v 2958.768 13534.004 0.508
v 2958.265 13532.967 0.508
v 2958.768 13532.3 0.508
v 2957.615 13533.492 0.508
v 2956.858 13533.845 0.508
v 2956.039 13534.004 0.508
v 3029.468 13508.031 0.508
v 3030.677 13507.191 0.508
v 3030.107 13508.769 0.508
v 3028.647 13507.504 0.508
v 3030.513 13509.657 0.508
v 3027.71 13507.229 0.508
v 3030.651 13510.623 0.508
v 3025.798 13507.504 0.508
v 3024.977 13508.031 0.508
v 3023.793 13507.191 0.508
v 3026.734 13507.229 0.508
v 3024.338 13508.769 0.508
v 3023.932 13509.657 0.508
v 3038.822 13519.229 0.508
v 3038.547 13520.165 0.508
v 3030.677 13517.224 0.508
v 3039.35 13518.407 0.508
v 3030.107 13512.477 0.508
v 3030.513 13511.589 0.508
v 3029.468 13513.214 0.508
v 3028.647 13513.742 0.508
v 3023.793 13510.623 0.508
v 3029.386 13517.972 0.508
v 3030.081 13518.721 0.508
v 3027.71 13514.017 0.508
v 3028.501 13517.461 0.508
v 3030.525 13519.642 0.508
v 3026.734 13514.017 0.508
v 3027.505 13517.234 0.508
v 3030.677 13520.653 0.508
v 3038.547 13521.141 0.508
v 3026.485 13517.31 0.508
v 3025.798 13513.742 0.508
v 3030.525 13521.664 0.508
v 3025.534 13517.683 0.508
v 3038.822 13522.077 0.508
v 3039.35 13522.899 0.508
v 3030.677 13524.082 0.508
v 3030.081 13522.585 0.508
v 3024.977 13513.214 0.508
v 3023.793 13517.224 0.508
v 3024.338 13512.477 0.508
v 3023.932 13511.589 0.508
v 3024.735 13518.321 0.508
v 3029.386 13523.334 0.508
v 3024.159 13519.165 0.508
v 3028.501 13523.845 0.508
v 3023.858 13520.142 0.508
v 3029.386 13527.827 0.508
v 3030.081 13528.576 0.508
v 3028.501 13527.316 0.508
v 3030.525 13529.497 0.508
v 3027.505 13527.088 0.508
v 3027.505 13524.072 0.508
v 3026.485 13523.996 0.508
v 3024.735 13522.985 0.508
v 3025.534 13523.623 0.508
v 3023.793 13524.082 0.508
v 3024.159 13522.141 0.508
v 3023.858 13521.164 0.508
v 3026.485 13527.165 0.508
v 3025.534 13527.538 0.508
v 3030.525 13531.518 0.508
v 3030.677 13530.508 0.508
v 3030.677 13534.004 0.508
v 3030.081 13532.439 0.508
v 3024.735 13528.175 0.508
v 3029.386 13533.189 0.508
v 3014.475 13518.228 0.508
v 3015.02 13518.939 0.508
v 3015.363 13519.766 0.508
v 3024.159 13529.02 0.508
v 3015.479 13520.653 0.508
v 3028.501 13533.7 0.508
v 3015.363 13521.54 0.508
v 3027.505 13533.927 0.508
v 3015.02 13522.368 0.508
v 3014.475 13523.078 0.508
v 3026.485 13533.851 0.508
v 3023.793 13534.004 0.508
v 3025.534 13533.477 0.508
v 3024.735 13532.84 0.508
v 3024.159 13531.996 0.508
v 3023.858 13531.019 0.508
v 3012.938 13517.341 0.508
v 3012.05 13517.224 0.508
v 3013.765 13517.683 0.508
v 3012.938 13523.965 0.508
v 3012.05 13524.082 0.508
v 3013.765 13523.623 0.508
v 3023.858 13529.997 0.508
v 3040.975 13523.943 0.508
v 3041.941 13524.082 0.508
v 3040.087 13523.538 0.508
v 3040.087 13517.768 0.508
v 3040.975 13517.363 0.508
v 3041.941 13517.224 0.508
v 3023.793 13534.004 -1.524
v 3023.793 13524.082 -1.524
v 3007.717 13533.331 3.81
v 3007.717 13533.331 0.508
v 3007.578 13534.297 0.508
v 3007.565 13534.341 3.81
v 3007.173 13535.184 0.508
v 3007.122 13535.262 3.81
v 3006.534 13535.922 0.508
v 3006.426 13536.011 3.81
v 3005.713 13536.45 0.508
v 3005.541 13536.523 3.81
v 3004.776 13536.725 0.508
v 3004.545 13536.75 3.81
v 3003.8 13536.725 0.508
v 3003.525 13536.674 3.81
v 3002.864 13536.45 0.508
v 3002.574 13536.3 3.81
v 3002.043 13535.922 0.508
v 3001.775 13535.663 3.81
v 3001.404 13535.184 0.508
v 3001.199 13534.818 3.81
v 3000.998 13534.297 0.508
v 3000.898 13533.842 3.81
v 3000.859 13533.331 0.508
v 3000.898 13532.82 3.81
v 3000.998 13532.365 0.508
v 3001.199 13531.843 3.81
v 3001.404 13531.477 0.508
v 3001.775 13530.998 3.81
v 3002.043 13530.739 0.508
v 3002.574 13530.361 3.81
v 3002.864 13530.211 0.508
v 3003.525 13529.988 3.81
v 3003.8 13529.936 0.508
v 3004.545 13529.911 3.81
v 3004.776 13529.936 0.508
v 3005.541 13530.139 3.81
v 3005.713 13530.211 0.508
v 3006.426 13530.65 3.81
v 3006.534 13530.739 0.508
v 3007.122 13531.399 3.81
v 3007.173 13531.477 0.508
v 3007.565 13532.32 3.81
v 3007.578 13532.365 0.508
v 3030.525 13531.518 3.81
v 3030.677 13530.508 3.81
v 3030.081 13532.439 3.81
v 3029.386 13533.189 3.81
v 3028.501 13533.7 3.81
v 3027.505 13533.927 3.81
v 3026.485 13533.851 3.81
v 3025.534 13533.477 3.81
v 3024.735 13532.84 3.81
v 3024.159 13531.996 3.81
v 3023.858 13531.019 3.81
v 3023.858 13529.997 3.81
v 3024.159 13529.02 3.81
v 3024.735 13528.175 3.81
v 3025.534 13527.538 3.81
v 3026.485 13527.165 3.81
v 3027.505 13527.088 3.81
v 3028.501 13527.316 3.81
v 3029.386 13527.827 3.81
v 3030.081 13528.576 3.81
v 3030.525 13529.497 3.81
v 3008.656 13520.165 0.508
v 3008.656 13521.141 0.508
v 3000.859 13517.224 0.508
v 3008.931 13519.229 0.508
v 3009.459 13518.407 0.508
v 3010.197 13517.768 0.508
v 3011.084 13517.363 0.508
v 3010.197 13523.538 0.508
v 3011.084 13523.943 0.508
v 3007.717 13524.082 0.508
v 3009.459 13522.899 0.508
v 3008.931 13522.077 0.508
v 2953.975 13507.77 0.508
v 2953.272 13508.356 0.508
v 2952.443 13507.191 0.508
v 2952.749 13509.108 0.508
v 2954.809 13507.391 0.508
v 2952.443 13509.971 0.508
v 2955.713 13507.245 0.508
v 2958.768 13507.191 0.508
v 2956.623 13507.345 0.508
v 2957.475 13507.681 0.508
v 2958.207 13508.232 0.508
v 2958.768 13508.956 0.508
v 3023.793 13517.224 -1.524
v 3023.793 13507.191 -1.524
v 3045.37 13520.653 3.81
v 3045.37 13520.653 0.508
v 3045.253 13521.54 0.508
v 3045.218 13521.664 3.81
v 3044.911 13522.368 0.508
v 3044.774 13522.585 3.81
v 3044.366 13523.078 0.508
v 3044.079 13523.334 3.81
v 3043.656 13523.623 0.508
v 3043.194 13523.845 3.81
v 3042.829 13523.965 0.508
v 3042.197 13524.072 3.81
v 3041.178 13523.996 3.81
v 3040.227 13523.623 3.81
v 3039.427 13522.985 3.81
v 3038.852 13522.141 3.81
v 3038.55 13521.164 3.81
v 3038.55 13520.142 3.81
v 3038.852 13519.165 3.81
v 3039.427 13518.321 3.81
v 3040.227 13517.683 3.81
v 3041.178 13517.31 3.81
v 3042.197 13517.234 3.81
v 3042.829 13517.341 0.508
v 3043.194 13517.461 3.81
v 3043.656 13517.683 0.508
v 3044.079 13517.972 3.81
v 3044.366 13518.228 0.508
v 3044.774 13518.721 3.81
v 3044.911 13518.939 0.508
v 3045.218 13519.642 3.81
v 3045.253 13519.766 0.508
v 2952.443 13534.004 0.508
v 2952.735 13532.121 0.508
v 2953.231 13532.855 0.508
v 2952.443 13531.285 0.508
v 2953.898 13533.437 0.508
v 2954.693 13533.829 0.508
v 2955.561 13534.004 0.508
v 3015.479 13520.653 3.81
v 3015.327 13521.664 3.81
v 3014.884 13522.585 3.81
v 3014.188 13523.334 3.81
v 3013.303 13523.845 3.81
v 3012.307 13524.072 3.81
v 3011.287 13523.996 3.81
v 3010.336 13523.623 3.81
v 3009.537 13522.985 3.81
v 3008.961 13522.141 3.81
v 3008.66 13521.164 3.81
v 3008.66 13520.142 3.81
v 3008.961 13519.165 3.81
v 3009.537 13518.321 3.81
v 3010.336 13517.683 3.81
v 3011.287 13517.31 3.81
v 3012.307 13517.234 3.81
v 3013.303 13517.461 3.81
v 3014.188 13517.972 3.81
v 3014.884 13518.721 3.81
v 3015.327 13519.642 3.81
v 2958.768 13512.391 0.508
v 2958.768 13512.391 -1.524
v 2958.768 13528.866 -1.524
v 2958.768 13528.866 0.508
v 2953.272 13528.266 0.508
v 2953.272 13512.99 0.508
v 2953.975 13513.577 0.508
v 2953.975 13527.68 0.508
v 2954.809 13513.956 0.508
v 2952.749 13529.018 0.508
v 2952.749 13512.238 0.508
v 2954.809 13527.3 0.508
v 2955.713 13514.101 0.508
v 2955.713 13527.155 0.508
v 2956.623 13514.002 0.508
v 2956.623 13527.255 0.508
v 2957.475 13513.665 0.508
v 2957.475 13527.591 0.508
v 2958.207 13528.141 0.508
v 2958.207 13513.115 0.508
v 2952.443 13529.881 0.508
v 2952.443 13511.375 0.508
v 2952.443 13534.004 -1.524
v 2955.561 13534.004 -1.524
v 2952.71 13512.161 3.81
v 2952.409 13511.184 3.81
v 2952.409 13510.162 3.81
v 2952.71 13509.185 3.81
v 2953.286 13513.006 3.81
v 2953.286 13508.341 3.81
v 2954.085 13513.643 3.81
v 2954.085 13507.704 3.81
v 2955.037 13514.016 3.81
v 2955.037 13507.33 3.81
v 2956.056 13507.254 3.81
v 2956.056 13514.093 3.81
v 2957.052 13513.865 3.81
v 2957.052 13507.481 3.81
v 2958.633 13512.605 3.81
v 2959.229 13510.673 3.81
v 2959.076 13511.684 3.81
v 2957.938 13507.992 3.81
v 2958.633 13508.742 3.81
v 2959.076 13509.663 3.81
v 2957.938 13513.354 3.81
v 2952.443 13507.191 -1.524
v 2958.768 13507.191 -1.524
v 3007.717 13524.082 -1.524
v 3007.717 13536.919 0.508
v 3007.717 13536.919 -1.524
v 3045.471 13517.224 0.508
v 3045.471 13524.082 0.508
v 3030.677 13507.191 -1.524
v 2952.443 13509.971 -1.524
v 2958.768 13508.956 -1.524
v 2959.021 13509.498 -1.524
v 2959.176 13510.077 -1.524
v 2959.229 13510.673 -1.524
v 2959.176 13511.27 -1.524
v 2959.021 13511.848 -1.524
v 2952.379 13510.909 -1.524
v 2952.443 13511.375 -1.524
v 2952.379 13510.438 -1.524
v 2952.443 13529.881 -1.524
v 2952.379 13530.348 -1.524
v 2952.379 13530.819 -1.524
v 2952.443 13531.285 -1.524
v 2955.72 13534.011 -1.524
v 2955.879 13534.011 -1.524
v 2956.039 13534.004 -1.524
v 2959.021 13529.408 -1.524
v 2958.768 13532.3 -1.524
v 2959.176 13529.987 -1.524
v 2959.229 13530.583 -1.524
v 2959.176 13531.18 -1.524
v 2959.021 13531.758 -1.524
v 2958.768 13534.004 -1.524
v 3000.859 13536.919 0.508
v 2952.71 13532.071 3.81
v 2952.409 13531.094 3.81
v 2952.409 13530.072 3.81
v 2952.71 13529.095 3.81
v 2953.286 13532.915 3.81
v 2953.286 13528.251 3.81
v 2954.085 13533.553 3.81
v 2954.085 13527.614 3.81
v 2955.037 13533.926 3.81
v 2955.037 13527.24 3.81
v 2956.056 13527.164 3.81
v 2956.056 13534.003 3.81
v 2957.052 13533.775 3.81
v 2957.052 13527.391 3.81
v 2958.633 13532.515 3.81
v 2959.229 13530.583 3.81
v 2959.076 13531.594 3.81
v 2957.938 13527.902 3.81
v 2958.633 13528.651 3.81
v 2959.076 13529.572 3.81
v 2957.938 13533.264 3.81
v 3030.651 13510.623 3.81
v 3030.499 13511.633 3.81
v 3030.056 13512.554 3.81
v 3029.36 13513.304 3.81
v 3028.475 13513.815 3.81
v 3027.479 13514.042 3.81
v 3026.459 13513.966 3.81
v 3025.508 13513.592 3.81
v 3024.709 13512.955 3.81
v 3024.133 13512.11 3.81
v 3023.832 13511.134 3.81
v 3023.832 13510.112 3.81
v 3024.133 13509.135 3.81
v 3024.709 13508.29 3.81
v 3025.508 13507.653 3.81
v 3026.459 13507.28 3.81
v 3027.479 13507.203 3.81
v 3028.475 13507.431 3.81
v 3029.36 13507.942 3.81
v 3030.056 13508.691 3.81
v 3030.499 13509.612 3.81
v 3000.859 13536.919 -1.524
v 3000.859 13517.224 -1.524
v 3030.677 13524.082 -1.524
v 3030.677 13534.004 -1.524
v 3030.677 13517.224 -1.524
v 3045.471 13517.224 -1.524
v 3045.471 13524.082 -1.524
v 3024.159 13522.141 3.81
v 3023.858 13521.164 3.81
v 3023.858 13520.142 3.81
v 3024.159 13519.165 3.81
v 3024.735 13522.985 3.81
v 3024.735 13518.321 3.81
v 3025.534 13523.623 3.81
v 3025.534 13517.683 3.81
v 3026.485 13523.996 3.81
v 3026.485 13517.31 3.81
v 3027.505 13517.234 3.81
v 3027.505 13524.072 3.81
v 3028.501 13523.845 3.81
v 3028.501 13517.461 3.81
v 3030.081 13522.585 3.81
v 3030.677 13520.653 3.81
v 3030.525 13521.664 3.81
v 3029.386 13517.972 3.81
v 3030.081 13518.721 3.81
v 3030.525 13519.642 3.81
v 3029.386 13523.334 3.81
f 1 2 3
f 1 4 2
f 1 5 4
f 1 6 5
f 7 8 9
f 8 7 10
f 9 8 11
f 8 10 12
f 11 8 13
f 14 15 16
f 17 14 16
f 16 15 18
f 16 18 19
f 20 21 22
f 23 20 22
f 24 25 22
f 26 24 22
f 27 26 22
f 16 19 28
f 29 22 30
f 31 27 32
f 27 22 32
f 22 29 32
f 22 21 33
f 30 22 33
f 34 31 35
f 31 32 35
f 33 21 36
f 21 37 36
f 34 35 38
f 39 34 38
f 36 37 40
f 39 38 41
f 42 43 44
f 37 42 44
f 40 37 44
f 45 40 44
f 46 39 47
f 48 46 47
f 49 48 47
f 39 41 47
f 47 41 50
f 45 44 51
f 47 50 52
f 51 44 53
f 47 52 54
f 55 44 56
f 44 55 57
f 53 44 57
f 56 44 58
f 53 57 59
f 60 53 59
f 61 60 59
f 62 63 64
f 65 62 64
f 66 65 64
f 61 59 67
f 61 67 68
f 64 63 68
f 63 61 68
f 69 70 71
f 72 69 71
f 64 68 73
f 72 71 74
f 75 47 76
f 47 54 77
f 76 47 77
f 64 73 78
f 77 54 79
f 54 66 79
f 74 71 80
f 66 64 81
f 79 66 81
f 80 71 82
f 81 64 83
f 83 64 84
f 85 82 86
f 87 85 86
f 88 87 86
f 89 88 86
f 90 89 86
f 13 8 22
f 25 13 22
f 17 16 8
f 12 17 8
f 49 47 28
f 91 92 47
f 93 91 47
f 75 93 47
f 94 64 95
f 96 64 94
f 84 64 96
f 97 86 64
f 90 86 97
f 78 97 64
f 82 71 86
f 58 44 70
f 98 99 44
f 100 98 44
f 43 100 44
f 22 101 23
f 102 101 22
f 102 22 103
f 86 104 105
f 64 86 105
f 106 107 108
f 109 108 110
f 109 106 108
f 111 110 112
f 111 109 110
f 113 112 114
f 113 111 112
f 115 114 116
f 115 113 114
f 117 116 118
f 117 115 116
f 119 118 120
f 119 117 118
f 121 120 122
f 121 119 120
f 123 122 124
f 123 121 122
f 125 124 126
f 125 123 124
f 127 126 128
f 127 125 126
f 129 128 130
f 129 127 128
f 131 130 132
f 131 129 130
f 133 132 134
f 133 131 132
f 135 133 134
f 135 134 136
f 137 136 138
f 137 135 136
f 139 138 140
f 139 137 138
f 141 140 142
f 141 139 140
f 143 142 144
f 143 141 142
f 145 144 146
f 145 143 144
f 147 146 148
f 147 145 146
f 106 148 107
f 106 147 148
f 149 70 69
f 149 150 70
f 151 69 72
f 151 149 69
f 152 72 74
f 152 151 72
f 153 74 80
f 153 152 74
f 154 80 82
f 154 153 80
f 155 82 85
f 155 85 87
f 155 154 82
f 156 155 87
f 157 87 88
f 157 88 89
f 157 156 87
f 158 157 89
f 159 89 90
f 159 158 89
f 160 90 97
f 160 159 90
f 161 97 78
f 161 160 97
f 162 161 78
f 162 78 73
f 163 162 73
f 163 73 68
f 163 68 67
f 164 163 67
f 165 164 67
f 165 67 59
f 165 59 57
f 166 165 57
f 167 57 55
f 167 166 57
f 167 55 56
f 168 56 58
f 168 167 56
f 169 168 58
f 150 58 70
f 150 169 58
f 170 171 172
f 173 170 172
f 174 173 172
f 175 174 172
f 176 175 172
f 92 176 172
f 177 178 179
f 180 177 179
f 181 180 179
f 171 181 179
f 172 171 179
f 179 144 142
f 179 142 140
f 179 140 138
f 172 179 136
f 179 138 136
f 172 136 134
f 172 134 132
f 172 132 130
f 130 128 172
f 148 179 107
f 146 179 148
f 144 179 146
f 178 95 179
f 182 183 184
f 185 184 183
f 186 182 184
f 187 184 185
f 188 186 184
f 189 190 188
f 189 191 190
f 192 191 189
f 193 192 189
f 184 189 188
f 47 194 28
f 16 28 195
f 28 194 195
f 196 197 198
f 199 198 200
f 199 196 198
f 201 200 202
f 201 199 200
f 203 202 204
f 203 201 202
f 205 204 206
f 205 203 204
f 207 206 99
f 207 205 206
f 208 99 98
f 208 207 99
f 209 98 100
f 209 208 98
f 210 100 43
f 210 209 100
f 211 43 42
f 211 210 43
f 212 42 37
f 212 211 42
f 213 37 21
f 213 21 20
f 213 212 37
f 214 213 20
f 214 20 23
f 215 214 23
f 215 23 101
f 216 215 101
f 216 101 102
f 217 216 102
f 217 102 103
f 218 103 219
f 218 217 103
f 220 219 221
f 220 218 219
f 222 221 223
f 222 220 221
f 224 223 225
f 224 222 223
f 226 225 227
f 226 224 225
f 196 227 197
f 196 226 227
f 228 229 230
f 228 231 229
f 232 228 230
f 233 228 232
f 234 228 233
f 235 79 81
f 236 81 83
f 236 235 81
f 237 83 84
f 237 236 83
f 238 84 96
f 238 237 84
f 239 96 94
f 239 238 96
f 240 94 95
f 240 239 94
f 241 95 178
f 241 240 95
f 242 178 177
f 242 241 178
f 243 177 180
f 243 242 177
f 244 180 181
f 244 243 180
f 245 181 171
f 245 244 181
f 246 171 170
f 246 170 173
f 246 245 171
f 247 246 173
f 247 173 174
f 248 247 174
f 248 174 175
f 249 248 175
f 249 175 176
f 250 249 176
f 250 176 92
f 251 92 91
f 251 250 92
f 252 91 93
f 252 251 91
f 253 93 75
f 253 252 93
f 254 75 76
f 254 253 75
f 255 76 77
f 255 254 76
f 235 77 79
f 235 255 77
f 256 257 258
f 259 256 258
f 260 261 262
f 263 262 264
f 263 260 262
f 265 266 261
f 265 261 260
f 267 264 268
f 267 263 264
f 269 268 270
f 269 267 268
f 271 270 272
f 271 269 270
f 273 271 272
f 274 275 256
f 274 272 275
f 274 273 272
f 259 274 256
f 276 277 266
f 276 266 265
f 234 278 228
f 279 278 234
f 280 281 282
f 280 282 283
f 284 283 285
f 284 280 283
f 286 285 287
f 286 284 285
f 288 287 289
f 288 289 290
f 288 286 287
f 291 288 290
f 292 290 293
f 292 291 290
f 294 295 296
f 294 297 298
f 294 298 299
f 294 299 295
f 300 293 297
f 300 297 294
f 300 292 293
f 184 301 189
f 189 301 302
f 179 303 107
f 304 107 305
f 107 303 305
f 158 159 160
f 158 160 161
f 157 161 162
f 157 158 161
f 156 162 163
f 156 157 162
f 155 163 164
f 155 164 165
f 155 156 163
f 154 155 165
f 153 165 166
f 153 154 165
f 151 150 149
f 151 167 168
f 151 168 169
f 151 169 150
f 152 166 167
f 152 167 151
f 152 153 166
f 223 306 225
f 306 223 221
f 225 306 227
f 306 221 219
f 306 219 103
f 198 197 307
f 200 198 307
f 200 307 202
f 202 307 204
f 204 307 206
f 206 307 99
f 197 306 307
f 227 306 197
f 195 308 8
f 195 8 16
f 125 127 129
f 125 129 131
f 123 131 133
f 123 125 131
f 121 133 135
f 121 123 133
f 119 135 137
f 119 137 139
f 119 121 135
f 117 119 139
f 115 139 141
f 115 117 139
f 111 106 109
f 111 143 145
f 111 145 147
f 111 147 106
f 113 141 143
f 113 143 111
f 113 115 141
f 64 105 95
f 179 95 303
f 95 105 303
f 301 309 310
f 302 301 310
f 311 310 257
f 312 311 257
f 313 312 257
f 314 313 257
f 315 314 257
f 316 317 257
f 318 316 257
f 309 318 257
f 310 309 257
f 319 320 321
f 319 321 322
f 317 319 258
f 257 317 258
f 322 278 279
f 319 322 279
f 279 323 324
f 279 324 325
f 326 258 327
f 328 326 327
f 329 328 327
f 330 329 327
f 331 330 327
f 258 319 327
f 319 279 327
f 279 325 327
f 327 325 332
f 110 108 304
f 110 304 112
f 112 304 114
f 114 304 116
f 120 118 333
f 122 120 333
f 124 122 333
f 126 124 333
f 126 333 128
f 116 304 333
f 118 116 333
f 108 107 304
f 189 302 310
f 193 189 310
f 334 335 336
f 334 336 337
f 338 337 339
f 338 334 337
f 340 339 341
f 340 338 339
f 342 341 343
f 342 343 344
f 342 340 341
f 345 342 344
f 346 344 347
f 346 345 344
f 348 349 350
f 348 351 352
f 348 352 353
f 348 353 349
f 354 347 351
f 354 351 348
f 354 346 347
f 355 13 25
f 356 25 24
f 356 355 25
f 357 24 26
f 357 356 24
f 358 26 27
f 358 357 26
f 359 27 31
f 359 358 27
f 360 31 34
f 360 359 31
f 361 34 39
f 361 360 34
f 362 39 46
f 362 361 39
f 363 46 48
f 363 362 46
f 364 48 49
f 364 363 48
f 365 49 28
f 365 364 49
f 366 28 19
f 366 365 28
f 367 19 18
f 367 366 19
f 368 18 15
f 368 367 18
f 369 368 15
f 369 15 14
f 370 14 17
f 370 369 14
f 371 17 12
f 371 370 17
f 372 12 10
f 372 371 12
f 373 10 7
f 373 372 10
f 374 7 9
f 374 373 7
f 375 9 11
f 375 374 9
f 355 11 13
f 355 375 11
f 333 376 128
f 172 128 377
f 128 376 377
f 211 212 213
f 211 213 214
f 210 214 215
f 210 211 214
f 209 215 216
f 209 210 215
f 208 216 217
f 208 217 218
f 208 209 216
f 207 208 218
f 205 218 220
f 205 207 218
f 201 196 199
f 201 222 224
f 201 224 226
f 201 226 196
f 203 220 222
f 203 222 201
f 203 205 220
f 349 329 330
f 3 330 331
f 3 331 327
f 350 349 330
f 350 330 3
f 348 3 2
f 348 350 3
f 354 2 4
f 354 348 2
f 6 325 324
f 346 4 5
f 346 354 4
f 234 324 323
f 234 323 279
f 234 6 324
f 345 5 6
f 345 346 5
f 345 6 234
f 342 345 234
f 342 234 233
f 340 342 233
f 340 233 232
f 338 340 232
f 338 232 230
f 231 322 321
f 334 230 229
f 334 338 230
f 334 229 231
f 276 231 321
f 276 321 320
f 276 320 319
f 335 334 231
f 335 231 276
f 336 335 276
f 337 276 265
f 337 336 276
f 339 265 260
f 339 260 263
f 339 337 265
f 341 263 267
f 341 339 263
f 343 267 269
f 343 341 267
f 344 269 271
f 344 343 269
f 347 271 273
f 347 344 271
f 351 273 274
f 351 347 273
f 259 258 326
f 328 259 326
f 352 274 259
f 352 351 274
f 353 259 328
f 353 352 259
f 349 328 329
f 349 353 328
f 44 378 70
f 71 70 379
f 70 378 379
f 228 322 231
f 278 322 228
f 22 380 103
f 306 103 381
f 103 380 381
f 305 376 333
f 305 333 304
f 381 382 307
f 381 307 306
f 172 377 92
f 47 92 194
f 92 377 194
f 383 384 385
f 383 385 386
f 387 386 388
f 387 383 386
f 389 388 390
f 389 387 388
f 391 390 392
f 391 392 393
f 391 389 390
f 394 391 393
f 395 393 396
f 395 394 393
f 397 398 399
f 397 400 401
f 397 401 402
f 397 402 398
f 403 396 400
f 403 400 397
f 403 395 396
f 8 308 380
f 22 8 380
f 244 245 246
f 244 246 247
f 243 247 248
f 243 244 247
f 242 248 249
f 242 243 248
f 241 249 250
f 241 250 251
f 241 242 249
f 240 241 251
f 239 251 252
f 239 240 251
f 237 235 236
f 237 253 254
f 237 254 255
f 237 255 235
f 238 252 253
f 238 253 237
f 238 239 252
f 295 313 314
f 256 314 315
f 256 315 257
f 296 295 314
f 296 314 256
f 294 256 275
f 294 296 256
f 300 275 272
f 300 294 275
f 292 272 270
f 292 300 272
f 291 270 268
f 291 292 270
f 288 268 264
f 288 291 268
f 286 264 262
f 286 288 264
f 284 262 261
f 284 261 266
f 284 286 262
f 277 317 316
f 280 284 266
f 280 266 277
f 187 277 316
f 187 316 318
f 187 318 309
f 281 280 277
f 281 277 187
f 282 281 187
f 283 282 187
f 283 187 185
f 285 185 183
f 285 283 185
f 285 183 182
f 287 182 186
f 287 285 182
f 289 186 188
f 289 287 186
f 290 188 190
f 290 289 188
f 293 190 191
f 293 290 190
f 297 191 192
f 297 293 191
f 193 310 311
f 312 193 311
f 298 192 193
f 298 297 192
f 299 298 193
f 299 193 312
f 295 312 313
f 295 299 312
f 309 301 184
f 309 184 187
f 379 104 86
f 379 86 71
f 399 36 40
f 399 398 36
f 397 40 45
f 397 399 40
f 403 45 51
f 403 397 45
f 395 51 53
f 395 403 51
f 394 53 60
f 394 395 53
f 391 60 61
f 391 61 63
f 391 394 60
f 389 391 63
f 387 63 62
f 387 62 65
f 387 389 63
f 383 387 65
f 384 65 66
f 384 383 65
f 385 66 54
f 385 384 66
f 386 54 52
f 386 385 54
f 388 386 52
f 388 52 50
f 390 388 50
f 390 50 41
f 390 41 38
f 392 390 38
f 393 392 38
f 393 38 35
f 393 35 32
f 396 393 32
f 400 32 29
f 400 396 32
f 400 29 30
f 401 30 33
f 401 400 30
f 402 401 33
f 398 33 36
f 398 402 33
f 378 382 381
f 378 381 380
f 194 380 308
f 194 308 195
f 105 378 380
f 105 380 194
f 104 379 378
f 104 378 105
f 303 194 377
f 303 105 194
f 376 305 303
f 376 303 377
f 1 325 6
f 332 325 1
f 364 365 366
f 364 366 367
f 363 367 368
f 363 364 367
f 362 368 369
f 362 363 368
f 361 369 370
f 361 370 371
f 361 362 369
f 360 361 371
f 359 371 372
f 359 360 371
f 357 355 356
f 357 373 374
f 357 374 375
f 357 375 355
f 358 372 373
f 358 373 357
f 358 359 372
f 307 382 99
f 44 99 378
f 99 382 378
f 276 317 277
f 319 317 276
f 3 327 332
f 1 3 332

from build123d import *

# Parameters (mm, degrees)
SKETCH1_R                  = 3.429
BOSS_EXTRUDE1_DEPTH        = 3.81
BOSS_EXTRUDE1_DEPTH_BACK   = 1.524
BOSS_EXTRUDE1_2_DEPTH      = 3.81
BOSS_EXTRUDE1_2_DEPTH_BACK = 1.524
BOSS_EXTRUDE1_3_DEPTH      = 3.81
BOSS_EXTRUDE1_3_DEPTH_BACK = 1.524
BOSS_EXTRUDE1_4_DEPTH      = 3.81
BOSS_EXTRUDE1_4_DEPTH_BACK = 1.524
BOSS_EXTRUDE1_5_DEPTH      = 3.81
BOSS_EXTRUDE1_5_DEPTH_BACK = 1.524
BOSS_EXTRUDE1_6_DEPTH      = 3.81
BOSS_EXTRUDE1_6_DEPTH_BACK = 1.524
BOSS_EXTRUDE1_7_DEPTH      = 3.81
BOSS_EXTRUDE1_7_DEPTH_BACK = 1.524
BOSS_EXTRUDE1_8_DEPTH      = 3.81
BOSS_EXTRUDE1_8_DEPTH_BACK = 1.524
SKETCH2_W                  = 6.324370589
SKETCH2_H                  = 26.812883823
BOSS_EXTRUDE2_DEPTH        = 2.032


with BuildPart() as part:
    # Sketch1 → Boss-Extrude1 (new body, two sides)
    with BuildSketch(Plane.XY) as boss_extrude1_sk:
        with Locations((3027.248279136, 13530.507714547)):
            Circle(SKETCH1_R)
    extrude(amount=BOSS_EXTRUDE1_DEPTH)
    extrude(boss_extrude1_sk.sketch, amount=-BOSS_EXTRUDE1_DEPTH_BACK)



with BuildPart() as body_2:
    # Sketch1 → Boss-Extrude1 2 (new body, two sides)
    with BuildSketch(Plane.XY) as boss_extrude1_2_sk:
        with Locations((3027.248279136, 13520.653009344)):
            Circle(SKETCH1_R)
    extrude(amount=BOSS_EXTRUDE1_2_DEPTH)
    extrude(boss_extrude1_2_sk.sketch, amount=-BOSS_EXTRUDE1_2_DEPTH_BACK)


with BuildPart() as body_3:
    # Sketch1 → Boss-Extrude1 3 (new body, two sides)
    with BuildSketch(Plane.XY) as boss_extrude1_3_sk:
        with Locations((3027.222481478, 13510.622681626)):
            Circle(SKETCH1_R)
    extrude(amount=BOSS_EXTRUDE1_3_DEPTH)
    extrude(boss_extrude1_3_sk.sketch, amount=-BOSS_EXTRUDE1_3_DEPTH_BACK)


with BuildPart() as body_4:
    # Sketch1 → Boss-Extrude1 4 (new body, two sides)
    with BuildSketch(Plane.XY) as boss_extrude1_4_sk:
        with Locations((3041.941037356, 13520.653009344)):
            Circle(SKETCH1_R)
    extrude(amount=BOSS_EXTRUDE1_4_DEPTH)
    extrude(boss_extrude1_4_sk.sketch, amount=-BOSS_EXTRUDE1_4_DEPTH_BACK)


with BuildPart() as body_5:
    # Sketch1 → Boss-Extrude1 5 (new body, two sides)
    with BuildSketch(Plane.XY) as boss_extrude1_5_sk:
        with Locations((3012.050482156, 13520.653009344)):
            Circle(SKETCH1_R)
    extrude(amount=BOSS_EXTRUDE1_5_DEPTH)
    extrude(boss_extrude1_5_sk.sketch, amount=-BOSS_EXTRUDE1_5_DEPTH_BACK)


with BuildPart() as body_6:
    # Sketch1 → Boss-Extrude1 6 (new body, two sides)
    with BuildSketch(Plane.XY) as boss_extrude1_6_sk:
        with Locations((3004.288365233, 13533.330572833)):
            Circle(SKETCH1_R)
    extrude(amount=BOSS_EXTRUDE1_6_DEPTH)
    extrude(boss_extrude1_6_sk.sketch, amount=-BOSS_EXTRUDE1_6_DEPTH_BACK)


with BuildPart() as body_7:
    # Sketch1 → Boss-Extrude1 7 (new body, two sides)
    with BuildSketch(Plane.XY) as boss_extrude1_7_sk:
        with Locations((2955.799681977, 13530.583123085)):
            Circle(SKETCH1_R)
    extrude(amount=BOSS_EXTRUDE1_7_DEPTH)
    extrude(boss_extrude1_7_sk.sketch, amount=-BOSS_EXTRUDE1_7_DEPTH_BACK)


with BuildPart() as body_8:
    # Sketch1 → Boss-Extrude1 8 (new body, two sides)
    with BuildSketch(Plane.XY) as boss_extrude1_8_sk:
        with Locations((2955.799681977, 13510.673284723)):
            Circle(SKETCH1_R)
    extrude(amount=BOSS_EXTRUDE1_8_DEPTH)
    extrude(boss_extrude1_8_sk.sketch, amount=-BOSS_EXTRUDE1_8_DEPTH_BACK)


with BuildPart() as part_1:
    add(part.part)

    add(body_2.part)  # Boss-Extrude2 merges body 2

    add(body_3.part)  # Boss-Extrude2 merges body 3

    add(body_4.part)  # Boss-Extrude2 merges body 4

    add(body_5.part)  # Boss-Extrude2 merges body 5

    add(body_6.part)  # Boss-Extrude2 merges body 6

    add(body_7.part)  # Boss-Extrude2 merges body 7

    add(body_8.part)  # Boss-Extrude2 merges body 8
    # Sketch2 → Boss-Extrude2 (add)
    with BuildSketch(Plane.XY.offset(-1.524)):
        Polygon((3030.677279136, 13517.224009344), (3030.677279136, 13510.622681626), (3030.677279136, 13507.190904571), (3023.793481478, 13507.190904571), (3023.793481478, 13510.622681626), (3023.793481478, 13517.224009344), (3012.050482156, 13517.224009344), (3007.717365233, 13517.224009344), (3000.859365233, 13517.224009344), (3000.859365233, 13533.330572833), (3000.859365233, 13536.919471065), (3007.717365233, 13536.919471065), (3007.717365233, 13533.330572833), (3007.717365233, 13524.082009344), (3012.050482156, 13524.082009344), (3023.793481478, 13524.082009344), (3023.793481478, 13530.507714547), (3023.793481478, 13534.003788394), (3030.677279136, 13534.003788394), (3030.677279136, 13530.507714547), (3030.677279136, 13524.082009344), (3041.941037356, 13524.082009344), (3045.471415541, 13524.082009344), (3045.471415541, 13517.224009344), (3041.941037356, 13517.224009344), align=None)
        with Locations((2955.605463986, 13520.597346483)):
            Rectangle(SKETCH2_W, SKETCH2_H)
    extrude(amount=BOSS_EXTRUDE2_DEPTH)


solid = part_1.part
